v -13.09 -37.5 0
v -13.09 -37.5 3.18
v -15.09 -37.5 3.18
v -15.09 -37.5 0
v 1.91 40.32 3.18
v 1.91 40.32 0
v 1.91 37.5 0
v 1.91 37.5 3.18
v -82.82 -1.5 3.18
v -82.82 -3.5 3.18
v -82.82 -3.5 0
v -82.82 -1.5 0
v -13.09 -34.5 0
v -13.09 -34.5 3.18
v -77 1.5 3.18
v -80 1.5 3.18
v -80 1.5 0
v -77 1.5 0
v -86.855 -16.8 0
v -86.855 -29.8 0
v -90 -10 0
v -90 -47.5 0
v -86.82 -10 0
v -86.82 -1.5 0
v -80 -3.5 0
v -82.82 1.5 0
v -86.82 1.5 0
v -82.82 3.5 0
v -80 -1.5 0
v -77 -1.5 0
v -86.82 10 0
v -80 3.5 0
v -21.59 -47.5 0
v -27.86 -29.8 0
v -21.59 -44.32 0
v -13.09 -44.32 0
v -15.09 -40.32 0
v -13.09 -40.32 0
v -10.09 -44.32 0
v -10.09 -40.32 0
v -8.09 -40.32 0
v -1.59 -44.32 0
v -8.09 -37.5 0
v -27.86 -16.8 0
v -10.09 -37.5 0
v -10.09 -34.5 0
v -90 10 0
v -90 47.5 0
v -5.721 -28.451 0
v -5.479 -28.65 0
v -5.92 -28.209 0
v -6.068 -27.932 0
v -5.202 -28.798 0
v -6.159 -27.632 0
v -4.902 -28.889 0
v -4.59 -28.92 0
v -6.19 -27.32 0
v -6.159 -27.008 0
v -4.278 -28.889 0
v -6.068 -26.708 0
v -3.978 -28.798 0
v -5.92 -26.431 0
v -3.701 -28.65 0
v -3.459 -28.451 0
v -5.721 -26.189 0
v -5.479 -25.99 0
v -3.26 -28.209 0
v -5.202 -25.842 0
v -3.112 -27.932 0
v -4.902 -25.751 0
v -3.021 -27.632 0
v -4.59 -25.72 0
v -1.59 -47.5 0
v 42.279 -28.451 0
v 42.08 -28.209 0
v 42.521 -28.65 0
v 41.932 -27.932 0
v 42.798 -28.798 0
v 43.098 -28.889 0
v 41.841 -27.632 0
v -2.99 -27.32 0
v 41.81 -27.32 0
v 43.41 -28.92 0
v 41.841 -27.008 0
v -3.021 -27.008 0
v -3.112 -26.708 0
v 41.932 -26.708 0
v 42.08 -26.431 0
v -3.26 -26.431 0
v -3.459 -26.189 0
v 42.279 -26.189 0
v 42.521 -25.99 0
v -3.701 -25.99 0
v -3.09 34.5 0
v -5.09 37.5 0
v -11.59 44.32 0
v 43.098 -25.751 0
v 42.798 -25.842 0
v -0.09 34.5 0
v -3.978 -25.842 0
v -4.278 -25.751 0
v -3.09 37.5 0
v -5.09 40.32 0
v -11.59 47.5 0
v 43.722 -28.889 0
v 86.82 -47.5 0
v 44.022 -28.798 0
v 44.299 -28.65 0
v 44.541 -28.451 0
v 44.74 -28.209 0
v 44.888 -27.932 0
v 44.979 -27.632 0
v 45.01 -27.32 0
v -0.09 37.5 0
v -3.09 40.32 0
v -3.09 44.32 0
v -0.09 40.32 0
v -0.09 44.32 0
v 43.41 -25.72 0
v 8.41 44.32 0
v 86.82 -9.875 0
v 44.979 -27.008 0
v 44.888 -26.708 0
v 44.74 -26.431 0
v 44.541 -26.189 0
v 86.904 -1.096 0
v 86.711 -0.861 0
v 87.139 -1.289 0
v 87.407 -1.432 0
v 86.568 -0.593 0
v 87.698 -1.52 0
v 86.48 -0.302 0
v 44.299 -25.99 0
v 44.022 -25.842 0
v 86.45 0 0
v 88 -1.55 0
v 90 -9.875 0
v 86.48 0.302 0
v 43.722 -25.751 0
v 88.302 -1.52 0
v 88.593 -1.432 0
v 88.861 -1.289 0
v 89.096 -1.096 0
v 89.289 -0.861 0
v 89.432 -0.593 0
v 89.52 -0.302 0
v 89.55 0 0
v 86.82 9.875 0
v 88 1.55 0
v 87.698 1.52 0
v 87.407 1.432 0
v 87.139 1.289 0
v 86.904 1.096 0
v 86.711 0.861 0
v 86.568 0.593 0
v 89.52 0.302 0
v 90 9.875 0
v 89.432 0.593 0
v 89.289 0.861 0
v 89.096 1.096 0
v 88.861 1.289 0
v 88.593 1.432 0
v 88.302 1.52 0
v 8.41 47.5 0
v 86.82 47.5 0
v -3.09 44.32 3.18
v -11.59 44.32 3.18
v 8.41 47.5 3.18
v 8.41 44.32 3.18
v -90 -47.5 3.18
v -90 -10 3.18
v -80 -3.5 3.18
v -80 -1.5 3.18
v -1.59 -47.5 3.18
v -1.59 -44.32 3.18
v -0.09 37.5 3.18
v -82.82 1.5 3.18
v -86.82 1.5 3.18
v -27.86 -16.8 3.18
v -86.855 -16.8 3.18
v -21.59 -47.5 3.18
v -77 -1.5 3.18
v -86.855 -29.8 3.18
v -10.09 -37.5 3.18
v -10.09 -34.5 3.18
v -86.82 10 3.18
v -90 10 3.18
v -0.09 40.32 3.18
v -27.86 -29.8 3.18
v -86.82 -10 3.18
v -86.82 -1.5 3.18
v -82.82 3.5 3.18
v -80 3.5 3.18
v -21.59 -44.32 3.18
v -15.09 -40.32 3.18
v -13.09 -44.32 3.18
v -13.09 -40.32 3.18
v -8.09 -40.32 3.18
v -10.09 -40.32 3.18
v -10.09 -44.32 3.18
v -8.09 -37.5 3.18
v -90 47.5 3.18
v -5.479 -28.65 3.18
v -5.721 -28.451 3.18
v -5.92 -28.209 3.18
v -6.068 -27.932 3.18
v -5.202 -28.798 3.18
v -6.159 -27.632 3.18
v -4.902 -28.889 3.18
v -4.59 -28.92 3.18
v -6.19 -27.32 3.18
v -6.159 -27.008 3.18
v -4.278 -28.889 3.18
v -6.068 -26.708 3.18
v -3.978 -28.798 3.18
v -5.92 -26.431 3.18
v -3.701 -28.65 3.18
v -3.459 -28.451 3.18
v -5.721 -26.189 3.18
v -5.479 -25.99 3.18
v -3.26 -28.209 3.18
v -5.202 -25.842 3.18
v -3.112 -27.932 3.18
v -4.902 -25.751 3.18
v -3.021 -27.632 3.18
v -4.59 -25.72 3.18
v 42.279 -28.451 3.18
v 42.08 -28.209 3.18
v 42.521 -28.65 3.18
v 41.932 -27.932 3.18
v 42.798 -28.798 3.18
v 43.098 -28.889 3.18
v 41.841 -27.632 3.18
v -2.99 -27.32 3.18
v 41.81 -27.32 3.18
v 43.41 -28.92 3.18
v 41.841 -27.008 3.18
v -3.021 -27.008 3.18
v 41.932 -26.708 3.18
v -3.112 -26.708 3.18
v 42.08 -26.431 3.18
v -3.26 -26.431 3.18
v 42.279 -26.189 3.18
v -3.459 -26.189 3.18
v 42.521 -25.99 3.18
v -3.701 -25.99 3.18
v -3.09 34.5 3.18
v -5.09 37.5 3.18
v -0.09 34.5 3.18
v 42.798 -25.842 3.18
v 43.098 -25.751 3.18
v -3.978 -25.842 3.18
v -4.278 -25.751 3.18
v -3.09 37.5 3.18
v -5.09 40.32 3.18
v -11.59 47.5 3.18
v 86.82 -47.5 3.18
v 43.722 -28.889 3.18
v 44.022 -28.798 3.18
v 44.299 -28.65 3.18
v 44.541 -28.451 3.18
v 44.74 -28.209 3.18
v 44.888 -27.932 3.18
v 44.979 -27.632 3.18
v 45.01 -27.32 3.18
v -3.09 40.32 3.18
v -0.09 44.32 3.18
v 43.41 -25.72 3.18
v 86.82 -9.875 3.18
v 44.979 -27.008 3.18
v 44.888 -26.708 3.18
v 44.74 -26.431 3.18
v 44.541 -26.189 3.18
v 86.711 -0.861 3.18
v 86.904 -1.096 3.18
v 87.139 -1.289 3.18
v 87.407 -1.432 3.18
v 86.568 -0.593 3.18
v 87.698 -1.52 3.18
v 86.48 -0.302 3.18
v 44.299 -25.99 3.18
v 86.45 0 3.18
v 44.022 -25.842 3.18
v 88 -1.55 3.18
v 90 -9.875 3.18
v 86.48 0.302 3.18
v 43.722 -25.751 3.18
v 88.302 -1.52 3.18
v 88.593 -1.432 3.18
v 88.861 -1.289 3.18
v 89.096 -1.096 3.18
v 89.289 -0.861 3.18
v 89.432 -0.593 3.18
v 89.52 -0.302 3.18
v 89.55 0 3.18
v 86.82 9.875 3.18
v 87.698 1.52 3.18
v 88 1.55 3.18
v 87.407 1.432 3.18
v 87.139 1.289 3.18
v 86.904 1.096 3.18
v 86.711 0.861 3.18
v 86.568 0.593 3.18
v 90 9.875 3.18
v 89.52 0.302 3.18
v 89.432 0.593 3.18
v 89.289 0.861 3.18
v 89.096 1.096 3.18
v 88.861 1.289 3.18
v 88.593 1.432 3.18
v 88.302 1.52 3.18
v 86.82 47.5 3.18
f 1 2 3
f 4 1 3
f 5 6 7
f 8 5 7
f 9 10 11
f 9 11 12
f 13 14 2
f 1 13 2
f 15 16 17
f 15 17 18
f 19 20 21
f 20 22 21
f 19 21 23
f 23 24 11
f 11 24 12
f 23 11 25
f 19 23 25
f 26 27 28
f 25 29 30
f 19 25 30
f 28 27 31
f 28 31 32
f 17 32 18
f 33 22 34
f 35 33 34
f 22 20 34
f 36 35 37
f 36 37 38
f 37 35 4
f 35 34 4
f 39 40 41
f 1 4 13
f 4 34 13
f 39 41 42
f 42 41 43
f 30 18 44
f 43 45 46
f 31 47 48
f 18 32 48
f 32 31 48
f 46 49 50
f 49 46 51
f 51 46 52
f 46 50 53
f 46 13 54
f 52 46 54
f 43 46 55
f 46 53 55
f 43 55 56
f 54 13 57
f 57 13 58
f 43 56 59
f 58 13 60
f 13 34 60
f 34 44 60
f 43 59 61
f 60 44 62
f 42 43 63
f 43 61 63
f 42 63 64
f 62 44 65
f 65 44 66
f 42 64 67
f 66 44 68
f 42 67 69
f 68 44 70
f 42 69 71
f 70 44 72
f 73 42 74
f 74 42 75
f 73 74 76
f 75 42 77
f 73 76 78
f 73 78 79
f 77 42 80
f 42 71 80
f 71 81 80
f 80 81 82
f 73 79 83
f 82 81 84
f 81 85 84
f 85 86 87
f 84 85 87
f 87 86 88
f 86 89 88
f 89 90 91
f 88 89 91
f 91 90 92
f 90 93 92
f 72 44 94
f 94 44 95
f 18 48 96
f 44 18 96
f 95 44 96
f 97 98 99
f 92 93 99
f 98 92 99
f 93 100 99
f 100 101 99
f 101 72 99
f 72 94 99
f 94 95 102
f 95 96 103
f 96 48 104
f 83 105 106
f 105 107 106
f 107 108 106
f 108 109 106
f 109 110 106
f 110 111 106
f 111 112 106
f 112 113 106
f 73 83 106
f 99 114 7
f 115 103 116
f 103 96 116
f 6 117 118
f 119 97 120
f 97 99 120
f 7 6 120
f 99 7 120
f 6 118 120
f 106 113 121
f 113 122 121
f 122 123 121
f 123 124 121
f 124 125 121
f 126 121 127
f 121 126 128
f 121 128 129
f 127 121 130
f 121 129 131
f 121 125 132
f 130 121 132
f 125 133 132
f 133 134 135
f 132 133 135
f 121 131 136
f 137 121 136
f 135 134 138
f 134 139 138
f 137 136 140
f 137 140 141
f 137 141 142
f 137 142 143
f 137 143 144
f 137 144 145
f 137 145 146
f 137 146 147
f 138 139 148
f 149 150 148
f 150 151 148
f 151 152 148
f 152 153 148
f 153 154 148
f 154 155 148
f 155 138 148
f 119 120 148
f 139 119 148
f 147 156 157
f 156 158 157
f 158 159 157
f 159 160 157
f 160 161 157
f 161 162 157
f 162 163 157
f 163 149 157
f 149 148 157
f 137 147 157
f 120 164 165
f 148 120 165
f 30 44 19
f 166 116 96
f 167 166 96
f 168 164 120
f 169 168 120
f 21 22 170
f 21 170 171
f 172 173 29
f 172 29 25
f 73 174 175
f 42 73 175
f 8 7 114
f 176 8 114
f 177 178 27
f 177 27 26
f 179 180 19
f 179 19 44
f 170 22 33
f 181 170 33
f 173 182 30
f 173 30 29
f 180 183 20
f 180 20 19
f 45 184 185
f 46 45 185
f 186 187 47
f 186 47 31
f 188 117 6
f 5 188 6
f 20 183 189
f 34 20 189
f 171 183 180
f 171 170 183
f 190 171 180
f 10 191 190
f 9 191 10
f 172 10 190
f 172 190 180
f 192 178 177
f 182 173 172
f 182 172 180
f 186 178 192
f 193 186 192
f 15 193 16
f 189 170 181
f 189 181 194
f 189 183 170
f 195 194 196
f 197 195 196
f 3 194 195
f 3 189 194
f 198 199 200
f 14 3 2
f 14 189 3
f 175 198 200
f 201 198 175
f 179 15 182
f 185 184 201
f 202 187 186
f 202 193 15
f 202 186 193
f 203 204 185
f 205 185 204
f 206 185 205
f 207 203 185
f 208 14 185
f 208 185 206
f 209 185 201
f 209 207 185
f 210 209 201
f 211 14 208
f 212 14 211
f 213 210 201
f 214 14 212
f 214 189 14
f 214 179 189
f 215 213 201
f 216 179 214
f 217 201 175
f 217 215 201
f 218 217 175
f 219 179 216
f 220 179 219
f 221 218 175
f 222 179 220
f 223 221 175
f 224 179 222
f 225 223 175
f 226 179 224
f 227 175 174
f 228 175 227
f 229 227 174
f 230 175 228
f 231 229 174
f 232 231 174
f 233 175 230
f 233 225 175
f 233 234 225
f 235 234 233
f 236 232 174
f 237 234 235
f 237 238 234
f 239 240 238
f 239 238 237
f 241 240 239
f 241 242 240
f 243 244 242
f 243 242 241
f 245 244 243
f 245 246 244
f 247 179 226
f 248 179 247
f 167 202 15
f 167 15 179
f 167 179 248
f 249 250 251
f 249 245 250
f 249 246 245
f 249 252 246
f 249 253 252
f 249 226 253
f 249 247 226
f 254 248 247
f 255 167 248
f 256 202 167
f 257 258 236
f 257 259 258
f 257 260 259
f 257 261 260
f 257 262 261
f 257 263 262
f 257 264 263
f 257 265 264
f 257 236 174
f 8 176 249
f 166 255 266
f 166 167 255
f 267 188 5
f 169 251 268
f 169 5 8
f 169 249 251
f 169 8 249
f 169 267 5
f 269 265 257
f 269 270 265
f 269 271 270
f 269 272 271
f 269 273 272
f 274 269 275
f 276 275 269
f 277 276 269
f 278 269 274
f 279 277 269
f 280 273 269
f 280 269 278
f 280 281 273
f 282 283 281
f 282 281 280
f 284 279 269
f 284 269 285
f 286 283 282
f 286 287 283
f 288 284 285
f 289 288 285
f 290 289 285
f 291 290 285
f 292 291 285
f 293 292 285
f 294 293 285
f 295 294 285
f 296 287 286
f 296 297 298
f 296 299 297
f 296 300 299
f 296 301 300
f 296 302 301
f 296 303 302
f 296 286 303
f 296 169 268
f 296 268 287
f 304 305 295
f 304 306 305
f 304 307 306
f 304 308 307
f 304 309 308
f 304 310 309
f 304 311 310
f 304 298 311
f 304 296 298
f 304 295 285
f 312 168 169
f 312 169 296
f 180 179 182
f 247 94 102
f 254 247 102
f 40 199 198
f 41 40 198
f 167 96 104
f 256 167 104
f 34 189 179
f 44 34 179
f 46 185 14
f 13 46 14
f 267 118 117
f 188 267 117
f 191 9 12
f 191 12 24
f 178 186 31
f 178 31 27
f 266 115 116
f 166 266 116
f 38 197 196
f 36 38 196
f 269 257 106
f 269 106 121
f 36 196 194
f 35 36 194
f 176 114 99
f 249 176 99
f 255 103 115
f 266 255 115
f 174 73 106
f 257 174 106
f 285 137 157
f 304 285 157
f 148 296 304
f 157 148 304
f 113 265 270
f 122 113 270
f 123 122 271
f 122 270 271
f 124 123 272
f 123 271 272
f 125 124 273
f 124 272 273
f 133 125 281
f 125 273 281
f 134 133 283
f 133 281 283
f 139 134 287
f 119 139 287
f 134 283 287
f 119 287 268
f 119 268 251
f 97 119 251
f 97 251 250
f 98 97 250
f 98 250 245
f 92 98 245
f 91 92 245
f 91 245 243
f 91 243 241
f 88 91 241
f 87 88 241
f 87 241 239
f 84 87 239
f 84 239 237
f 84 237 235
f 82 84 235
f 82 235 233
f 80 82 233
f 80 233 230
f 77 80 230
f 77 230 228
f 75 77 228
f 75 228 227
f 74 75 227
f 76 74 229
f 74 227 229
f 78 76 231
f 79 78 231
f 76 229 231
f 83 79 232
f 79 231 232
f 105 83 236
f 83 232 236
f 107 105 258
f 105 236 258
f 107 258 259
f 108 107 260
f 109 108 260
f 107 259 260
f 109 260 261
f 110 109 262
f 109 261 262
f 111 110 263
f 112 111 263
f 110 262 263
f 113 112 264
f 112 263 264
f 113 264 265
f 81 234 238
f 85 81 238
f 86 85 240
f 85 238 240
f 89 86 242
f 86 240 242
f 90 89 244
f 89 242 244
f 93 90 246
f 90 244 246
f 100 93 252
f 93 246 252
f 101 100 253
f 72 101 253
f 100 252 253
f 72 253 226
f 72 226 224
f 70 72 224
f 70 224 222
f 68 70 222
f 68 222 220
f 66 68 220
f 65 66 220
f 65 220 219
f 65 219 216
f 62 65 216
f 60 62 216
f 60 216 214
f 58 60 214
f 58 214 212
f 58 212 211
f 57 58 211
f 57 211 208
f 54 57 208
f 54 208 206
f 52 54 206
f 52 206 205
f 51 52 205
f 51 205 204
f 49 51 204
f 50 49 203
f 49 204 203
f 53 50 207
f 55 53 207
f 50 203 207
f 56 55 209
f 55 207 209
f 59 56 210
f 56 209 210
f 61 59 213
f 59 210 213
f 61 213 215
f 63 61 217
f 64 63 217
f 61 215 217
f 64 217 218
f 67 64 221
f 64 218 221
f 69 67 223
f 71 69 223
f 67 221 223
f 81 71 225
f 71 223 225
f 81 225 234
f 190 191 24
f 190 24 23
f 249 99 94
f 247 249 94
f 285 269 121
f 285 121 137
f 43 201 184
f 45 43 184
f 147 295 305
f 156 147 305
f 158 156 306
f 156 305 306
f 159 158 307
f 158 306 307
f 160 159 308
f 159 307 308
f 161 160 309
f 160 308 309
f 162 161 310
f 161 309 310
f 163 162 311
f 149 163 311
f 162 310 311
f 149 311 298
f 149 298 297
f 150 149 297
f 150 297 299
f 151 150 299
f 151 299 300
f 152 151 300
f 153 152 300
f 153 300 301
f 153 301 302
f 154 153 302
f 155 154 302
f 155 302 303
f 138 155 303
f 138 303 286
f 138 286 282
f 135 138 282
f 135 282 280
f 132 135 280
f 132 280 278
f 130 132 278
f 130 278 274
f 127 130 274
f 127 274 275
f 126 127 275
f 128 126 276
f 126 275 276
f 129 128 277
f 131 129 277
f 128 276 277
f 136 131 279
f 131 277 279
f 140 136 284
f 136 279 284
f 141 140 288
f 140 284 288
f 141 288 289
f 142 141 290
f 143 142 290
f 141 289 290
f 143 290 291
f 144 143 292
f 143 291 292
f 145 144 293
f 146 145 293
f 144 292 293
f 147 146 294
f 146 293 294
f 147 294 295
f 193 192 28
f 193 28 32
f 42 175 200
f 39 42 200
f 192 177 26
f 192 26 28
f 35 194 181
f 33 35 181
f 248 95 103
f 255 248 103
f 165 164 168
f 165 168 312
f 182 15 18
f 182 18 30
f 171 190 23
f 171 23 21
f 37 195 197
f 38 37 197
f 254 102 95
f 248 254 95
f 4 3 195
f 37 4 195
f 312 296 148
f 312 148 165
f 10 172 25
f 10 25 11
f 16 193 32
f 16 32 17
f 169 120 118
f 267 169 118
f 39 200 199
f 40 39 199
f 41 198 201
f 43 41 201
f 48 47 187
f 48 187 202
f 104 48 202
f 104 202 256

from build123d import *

# Parameters (mm, degrees)
SKETCH1_W               = 180
SKETCH1_H               = 95
BOSS_EXTRUDE1_DEPTH     = 3.18
SKETCH2_W               = 3.18
SKETCH2_H               = 37.625
CUT_EXTRUDE1_DEPTH      = 1
CUT_EXTRUDE1_DEPTH_BACK = 4.18
SKETCH3_R               = 1.55
CUT_EXTRUDE2_DEPTH      = 1
CUT_EXTRUDE2_DEPTH_BACK = 4.18
CUT_EXTRUDE3_DEPTH      = 1
CUT_EXTRUDE3_DEPTH_BACK = 4.18
CUT_EXTRUDE4_DEPTH      = 1
CUT_EXTRUDE4_DEPTH_BACK = 4.18
CUT_EXTRUDE5_DEPTH      = 1
CUT_EXTRUDE5_DEPTH_BACK = 4.18
SKETCH8_W               = 58.994769075
SKETCH8_H               = 13
CUT_EXTRUDE6_DEPTH      = 1
CUT_EXTRUDE6_DEPTH_BACK = 4.18
SKETCH9_R               = 1.6
CUT_EXTRUDE7_DEPTH      = 1
CUT_EXTRUDE7_DEPTH_BACK = 4.18


with BuildPart() as part:
    # Sketch1 → Boss-Extrude1 (new body)
    with BuildSketch(Plane.XY):
        Rectangle(SKETCH1_W, SKETCH1_H)
    extrude(amount=BOSS_EXTRUDE1_DEPTH)

    # Sketch2 → Cut-Extrude1 (cut, two sides)
    with BuildSketch(Plane.XY.offset(3.18)) as cut_extrude1_sk:
        with Locations((88.41, 28.6875)):
            Rectangle(SKETCH2_W, SKETCH2_H)
        with Locations((88.41, -28.6875)):
            Rectangle(SKETCH2_W, SKETCH2_H)
    extrude(amount=CUT_EXTRUDE1_DEPTH, mode=Mode.SUBTRACT)
    extrude(cut_extrude1_sk.sketch, amount=-CUT_EXTRUDE1_DEPTH_BACK, mode=Mode.SUBTRACT)

    # Sketch3 → Cut-Extrude2 (cut, two sides)
    with BuildSketch(Plane.XY.offset(3.18)) as cut_extrude2_sk:
        with Locations((88, 0)):
            Circle(SKETCH3_R)
    extrude(amount=CUT_EXTRUDE2_DEPTH, mode=Mode.SUBTRACT)
    extrude(cut_extrude2_sk.sketch, amount=-CUT_EXTRUDE2_DEPTH_BACK, mode=Mode.SUBTRACT)

    # Sketch5 → Cut-Extrude3 (cut, two sides)
    with BuildSketch(Plane(origin=(0, 0, 0), x_dir=(-1, 0, 0), z_dir=(0, 0, -1))) as cut_extrude3_sk:
        Polygon((11.59, 47.5), (-8.41, 47.5), (-8.41, 44.32), (0.09, 44.32), (0.09, 40.32), (-1.91, 40.32), (-1.91, 37.5), (0.09, 37.5), (0.09, 34.5), (3.09, 34.5), (3.09, 37.5), (5.09, 37.5), (5.09, 40.32), (3.09, 40.32), (3.09, 44.32), (11.59, 44.32), align=None)
    extrude(amount=CUT_EXTRUDE3_DEPTH, mode=Mode.SUBTRACT)
    extrude(cut_extrude3_sk.sketch, amount=-CUT_EXTRUDE3_DEPTH_BACK, mode=Mode.SUBTRACT)

    # Sketch6 → Cut-Extrude4 (cut, two sides)
    with BuildSketch(Plane.XY.offset(3.18)) as cut_extrude4_sk:
        Polygon((-21.59, -47.5), (-1.59, -47.5), (-1.59, -44.32), (-10.09, -44.32), (-10.09, -40.32), (-8.09, -40.32), (-8.09, -37.5), (-10.09, -37.5), (-10.09, -34.5), (-13.09, -34.5), (-13.09, -37.5), (-15.09, -37.5), (-15.09, -40.32), (-13.09, -40.32), (-13.09, -44.32), (-21.59, -44.32), align=None)
    extrude(amount=CUT_EXTRUDE4_DEPTH, mode=Mode.SUBTRACT)
    extrude(cut_extrude4_sk.sketch, amount=-CUT_EXTRUDE4_DEPTH_BACK, mode=Mode.SUBTRACT)

    # Sketch7 → Cut-Extrude5 (cut, two sides)
    with BuildSketch(Plane.XY.offset(3.18)) as cut_extrude5_sk:
        Polygon((-90, 10), (-86.82, 10), (-86.82, 1.5), (-82.82, 1.5), (-82.82, 3.5), (-80, 3.5), (-80, 1.5), (-77, 1.5), (-77, -1.5), (-80, -1.5), (-80, -3.5), (-82.82, -3.5), (-82.82, -1.5), (-86.82, -1.5), (-86.82, -10), (-90, -10), align=None)
    extrude(amount=CUT_EXTRUDE5_DEPTH, mode=Mode.SUBTRACT)
    extrude(cut_extrude5_sk.sketch, amount=-CUT_EXTRUDE5_DEPTH_BACK, mode=Mode.SUBTRACT)

    # Sketch8 → Cut-Extrude6 (cut, two sides)
    with BuildSketch(Plane.XY.offset(3.18)) as cut_extrude6_sk:
        with Locations((-57.357372864, -23.3)):
            Rectangle(SKETCH8_W, SKETCH8_H)
    extrude(amount=CUT_EXTRUDE6_DEPTH, mode=Mode.SUBTRACT)
    extrude(cut_extrude6_sk.sketch, amount=-CUT_EXTRUDE6_DEPTH_BACK, mode=Mode.SUBTRACT)

    # Sketch9 → Cut-Extrude7 (cut, two sides)
    with BuildSketch(Plane.XY.offset(3.18)) as cut_extrude7_sk:
        with Locations((-4.59, -27.32)):
            Circle(SKETCH9_R)
        with Locations((43.41, -27.32)):
            Circle(SKETCH9_R)
    extrude(amount=CUT_EXTRUDE7_DEPTH, mode=Mode.SUBTRACT)
    extrude(cut_extrude7_sk.sketch, amount=-CUT_EXTRUDE7_DEPTH_BACK, mode=Mode.SUBTRACT)


solid = part.part
